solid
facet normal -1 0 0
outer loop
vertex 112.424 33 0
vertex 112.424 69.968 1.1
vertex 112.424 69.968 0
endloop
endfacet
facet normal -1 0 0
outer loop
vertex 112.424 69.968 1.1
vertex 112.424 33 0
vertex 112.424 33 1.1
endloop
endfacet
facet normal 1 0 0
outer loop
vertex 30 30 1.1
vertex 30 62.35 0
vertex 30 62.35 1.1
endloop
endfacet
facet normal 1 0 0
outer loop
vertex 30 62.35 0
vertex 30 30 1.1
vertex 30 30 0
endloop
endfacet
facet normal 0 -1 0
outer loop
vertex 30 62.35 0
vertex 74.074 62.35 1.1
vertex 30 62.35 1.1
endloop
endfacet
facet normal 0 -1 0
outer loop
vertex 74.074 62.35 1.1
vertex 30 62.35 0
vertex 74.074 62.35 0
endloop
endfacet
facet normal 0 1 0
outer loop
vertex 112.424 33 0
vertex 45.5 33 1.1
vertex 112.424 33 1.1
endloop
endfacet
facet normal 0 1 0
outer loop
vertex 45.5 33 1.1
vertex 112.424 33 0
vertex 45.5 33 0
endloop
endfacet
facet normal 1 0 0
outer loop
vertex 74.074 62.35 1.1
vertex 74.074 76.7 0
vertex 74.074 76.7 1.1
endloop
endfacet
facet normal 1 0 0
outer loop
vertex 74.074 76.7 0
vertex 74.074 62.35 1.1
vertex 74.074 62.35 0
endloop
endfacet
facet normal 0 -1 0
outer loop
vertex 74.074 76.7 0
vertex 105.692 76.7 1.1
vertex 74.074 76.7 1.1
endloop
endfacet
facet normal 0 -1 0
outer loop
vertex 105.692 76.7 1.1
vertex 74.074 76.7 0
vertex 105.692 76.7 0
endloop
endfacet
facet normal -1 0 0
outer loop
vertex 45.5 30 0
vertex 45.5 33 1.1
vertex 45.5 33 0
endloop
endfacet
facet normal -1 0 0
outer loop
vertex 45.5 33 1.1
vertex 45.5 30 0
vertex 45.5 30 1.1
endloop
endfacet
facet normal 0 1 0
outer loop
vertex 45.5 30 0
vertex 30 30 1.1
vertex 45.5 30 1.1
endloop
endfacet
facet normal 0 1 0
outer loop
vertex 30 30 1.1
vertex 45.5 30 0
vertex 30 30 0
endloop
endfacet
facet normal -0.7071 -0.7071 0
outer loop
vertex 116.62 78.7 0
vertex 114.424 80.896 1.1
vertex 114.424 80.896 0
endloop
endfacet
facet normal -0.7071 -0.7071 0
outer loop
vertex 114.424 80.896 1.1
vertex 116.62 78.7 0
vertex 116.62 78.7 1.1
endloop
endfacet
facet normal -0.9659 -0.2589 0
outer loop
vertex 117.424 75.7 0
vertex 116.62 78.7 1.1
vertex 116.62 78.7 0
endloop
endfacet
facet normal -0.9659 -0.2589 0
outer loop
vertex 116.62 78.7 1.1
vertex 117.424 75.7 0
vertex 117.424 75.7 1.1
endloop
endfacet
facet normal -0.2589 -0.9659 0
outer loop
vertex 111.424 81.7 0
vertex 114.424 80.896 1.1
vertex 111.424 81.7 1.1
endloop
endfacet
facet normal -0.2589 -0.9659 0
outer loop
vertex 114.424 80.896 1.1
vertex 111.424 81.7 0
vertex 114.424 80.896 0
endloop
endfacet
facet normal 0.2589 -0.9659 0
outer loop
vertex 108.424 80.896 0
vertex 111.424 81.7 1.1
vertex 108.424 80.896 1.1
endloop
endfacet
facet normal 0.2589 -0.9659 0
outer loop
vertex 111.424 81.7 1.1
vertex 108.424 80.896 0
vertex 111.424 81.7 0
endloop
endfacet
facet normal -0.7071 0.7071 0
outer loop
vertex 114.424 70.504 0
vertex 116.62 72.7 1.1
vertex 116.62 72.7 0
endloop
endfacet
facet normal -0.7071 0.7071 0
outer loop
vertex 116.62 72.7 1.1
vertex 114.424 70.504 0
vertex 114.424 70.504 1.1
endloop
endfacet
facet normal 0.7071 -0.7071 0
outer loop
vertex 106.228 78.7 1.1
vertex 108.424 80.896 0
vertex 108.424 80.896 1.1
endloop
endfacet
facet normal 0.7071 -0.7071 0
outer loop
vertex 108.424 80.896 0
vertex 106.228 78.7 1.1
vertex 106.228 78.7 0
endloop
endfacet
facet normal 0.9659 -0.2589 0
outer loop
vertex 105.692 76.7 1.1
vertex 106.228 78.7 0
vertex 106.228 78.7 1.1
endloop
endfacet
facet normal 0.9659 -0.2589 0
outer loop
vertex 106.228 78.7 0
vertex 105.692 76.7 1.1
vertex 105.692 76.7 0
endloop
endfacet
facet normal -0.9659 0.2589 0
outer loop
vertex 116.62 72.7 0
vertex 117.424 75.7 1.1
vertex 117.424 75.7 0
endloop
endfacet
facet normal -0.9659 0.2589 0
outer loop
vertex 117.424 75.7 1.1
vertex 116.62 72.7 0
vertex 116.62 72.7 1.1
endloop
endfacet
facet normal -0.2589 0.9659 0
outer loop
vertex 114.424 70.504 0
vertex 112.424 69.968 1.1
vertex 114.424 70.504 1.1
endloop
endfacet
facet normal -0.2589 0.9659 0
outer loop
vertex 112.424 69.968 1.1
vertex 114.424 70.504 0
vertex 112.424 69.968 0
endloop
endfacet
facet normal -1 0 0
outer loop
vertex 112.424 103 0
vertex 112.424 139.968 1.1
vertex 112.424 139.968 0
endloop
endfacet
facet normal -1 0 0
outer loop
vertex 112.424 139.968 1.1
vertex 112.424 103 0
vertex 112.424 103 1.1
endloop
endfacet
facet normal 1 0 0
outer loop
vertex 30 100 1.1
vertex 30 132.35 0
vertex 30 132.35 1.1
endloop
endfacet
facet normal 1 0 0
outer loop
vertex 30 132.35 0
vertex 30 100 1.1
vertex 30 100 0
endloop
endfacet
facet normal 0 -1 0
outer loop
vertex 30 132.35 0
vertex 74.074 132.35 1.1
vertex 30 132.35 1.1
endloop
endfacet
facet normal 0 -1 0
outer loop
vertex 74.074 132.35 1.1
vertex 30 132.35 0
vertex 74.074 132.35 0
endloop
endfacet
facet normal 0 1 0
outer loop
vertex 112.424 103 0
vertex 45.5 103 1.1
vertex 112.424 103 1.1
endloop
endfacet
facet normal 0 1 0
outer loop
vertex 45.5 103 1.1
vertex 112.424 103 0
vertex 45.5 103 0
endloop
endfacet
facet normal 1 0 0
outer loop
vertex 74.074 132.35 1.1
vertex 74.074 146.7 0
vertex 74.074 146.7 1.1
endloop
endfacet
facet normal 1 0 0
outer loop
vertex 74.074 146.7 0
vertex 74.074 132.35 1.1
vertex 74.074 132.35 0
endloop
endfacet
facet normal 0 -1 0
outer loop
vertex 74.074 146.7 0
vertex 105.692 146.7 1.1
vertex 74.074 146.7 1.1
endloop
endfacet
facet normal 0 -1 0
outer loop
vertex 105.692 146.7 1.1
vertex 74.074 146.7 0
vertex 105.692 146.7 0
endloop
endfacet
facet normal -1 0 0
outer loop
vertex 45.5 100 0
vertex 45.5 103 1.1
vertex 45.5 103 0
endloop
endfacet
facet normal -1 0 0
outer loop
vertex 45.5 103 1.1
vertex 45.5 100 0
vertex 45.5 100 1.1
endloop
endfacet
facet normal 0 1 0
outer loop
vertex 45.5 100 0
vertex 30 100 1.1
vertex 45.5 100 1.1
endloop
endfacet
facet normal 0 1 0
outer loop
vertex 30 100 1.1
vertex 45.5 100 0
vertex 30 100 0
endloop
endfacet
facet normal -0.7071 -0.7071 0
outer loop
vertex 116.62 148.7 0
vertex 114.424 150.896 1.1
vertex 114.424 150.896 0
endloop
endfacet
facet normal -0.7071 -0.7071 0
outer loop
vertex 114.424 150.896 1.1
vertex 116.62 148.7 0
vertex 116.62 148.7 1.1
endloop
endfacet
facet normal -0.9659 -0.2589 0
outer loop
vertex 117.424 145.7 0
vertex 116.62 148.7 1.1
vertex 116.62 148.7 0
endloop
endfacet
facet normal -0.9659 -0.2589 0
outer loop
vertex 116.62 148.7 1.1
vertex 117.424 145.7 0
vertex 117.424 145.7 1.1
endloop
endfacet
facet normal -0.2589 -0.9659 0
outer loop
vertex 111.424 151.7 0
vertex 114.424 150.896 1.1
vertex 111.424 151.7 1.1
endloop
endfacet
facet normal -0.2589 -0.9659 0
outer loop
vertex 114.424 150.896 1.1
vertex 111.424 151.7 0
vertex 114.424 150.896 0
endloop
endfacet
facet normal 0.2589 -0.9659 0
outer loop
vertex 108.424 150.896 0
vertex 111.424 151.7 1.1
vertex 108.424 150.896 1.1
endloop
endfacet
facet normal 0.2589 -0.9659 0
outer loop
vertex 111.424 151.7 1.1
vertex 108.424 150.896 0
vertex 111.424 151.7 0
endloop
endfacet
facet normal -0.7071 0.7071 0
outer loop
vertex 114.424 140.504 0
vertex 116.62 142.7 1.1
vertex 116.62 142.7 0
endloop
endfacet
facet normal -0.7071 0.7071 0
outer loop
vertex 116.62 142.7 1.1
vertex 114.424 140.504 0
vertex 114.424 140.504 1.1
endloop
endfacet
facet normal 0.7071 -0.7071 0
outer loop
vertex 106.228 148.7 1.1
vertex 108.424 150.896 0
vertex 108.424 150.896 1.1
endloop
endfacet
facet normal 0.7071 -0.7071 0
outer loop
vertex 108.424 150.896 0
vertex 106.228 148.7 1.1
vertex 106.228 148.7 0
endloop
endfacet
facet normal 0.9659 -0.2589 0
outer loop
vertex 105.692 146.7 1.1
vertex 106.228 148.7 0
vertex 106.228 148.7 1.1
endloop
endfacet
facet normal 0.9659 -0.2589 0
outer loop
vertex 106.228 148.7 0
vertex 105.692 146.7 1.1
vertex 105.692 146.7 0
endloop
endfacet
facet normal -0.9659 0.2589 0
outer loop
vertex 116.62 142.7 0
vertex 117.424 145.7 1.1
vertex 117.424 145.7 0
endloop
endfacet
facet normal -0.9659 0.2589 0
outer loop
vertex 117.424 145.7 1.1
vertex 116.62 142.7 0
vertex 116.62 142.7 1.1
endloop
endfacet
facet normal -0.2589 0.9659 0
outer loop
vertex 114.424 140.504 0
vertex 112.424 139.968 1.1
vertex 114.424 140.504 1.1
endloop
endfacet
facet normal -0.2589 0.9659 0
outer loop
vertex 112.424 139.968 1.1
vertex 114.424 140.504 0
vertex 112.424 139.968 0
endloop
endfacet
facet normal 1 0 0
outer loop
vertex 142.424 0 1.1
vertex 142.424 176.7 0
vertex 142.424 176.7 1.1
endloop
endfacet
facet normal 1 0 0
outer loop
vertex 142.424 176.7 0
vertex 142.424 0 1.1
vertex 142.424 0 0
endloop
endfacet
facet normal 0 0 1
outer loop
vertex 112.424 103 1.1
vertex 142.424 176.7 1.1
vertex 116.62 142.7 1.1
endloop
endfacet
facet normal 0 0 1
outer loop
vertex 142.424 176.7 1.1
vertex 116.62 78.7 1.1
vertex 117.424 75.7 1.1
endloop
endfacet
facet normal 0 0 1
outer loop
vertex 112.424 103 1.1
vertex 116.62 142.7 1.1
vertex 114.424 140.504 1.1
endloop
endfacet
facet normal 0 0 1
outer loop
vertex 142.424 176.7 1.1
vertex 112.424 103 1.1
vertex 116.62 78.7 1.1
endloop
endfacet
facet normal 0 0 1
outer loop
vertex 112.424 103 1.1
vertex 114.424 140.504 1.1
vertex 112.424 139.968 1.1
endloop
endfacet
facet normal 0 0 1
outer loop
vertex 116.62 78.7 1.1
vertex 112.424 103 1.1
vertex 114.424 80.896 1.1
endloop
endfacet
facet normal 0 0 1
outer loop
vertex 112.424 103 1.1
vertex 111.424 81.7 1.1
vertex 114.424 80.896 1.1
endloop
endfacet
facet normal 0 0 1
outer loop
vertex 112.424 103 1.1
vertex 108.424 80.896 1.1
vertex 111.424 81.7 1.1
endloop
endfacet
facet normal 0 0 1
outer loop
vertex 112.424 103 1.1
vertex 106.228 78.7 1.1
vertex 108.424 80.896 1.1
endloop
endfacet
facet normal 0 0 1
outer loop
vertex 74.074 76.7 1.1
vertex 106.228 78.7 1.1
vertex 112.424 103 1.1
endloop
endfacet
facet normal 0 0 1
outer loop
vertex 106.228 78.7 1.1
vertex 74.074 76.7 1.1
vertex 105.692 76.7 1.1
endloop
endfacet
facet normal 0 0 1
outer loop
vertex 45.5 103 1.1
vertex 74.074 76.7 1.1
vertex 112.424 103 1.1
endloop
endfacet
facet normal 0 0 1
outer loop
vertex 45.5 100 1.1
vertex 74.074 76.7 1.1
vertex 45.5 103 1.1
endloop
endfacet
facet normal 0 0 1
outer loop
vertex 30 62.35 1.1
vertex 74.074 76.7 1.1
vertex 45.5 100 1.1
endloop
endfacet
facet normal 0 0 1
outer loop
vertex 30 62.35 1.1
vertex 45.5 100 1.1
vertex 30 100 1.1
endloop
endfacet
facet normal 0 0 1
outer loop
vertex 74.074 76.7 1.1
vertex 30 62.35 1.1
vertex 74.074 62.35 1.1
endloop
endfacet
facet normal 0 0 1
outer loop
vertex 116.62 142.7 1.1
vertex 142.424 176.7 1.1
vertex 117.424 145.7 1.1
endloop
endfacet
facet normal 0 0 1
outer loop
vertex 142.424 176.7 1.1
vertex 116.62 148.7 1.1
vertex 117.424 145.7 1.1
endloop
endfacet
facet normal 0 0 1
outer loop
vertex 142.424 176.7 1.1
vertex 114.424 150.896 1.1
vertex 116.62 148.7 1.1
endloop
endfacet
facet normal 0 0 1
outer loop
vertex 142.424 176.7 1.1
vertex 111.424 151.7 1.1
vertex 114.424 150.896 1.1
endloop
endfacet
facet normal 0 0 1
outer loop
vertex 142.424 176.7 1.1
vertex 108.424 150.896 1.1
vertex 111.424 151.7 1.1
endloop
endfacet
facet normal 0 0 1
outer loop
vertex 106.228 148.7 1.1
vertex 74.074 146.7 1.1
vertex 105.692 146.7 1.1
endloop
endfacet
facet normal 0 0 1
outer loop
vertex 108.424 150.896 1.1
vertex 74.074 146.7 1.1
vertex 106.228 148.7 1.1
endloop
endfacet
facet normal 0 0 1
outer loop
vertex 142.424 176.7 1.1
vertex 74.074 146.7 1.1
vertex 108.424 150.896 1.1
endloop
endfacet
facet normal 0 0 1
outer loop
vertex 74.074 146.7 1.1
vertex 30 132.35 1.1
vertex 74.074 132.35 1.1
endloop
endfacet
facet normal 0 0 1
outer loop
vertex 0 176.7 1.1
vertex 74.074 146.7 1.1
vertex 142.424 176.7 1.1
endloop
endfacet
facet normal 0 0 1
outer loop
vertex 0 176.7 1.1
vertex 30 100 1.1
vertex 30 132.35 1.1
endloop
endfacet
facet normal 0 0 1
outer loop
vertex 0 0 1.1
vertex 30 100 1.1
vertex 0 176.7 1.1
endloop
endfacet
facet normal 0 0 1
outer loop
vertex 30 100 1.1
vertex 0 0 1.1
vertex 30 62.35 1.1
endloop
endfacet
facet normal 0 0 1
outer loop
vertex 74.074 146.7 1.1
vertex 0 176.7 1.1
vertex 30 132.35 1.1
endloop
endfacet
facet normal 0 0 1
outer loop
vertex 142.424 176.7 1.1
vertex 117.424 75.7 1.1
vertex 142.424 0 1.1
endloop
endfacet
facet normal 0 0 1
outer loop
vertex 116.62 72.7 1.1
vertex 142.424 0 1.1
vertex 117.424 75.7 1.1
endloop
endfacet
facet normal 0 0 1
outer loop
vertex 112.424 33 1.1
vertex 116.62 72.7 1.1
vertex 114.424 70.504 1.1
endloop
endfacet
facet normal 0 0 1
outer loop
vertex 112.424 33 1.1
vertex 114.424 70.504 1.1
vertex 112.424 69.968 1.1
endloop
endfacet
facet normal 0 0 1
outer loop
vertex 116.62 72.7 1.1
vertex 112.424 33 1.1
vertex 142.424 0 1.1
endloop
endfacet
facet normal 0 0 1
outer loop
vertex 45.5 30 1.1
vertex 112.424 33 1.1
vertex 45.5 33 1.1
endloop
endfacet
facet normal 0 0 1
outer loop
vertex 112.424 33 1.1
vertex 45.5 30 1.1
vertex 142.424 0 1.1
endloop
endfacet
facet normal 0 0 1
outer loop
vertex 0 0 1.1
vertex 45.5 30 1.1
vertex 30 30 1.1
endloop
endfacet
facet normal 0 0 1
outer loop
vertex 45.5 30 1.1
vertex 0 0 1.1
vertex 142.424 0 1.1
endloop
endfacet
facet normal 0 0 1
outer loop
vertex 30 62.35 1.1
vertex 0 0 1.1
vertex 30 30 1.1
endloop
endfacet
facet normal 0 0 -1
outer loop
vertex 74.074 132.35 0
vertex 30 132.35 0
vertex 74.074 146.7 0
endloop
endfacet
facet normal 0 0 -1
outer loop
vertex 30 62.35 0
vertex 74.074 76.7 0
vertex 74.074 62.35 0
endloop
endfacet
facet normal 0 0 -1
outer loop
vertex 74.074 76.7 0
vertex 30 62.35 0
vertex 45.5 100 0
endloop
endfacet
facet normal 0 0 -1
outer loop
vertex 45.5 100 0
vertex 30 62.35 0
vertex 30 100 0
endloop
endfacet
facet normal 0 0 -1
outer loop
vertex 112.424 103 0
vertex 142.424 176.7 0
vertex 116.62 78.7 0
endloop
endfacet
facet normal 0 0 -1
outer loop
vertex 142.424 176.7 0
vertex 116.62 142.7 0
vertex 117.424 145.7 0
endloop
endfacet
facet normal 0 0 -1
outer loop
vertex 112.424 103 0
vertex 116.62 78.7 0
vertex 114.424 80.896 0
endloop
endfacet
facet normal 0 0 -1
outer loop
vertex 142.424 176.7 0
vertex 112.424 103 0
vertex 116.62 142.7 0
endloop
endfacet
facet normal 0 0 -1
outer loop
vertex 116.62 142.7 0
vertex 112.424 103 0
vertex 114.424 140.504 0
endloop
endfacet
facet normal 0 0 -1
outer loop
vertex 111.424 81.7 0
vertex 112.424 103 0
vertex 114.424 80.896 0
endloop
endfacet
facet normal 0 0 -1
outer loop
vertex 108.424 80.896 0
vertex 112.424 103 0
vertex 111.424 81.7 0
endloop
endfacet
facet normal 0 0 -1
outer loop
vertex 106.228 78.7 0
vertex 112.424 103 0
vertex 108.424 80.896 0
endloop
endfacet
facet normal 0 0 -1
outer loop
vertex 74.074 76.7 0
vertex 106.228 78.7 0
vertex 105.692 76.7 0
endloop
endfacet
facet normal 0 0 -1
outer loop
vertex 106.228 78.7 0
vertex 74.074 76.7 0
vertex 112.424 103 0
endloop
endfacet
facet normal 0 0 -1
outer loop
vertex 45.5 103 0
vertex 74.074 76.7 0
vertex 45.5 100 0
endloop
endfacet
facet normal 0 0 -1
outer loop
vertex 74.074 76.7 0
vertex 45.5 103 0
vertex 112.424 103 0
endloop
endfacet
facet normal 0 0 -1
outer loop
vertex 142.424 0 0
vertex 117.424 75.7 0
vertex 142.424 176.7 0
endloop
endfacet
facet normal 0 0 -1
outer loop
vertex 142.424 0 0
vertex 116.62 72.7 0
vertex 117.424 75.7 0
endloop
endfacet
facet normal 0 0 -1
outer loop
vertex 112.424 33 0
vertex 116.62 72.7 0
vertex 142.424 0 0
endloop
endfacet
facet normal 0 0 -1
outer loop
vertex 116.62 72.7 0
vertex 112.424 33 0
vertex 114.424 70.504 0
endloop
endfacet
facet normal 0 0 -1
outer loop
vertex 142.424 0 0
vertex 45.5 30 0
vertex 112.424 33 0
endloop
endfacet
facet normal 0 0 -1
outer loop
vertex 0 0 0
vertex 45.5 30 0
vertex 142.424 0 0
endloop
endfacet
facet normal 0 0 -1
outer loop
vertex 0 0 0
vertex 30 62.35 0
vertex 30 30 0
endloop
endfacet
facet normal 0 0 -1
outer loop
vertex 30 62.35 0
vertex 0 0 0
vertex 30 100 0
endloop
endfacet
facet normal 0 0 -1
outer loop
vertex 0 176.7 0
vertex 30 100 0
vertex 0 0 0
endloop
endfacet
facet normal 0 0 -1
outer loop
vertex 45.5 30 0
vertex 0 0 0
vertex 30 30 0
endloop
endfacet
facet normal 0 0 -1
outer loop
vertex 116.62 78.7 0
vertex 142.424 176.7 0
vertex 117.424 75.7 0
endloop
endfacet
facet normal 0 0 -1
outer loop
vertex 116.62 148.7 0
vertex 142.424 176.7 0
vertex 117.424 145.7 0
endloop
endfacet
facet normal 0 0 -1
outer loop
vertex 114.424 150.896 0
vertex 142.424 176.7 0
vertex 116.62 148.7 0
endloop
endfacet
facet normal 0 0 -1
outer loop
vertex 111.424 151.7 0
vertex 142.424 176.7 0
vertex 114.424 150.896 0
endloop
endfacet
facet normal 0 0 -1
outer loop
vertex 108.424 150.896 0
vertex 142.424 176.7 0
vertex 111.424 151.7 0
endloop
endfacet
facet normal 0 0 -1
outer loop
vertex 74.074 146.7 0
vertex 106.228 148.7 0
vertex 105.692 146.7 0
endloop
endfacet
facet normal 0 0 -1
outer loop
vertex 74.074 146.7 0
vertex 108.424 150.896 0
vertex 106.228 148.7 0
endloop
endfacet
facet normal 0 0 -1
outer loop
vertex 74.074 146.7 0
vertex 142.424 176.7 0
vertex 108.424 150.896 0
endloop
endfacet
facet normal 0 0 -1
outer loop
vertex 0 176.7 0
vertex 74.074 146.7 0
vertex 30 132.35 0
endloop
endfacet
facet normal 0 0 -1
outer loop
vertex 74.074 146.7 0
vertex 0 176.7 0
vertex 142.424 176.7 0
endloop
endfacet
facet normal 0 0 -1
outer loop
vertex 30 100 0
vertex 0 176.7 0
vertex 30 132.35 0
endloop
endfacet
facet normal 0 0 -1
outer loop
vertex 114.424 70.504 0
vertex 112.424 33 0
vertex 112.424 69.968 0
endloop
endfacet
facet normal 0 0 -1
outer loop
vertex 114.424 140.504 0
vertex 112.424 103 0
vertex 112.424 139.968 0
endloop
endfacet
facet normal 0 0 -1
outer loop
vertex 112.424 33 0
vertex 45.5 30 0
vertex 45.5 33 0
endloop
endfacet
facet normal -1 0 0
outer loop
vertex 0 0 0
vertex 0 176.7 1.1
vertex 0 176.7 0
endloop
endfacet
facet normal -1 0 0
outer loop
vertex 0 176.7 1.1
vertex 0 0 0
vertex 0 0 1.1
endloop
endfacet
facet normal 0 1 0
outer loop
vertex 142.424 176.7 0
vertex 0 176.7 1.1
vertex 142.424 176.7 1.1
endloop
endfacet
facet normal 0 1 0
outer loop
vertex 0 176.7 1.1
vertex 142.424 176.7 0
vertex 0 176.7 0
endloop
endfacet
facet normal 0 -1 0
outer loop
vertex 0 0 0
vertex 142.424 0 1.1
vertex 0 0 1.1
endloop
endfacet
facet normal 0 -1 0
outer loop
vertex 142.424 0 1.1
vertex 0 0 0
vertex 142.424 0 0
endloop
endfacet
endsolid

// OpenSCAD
// Holder for Ormerod prototype differential IR sensor board
// Choose layer height to be a submultiple of the thickness

thickness=1.1;	// board is 1.2mm but this part comes out slightly too thick
xborder=30;
yborder=30;
yrepeat=70;
height=82.07375;
width=29.00;
nibWidth=3.0;
nibHeight=15.5;	//actually 14.605
upperWidth=43.35;
upperHeight=38;
clearance=0.35;
cornerRadius=1.5;
cornerOffset=1;
overlap=1;

module wedge(x,y,z)
{
	polyhedron(
		points=[[0,0,0],[x,0,0],[0,y,0],[0,0,z],[x,0,z],[0,y,z]],
		faces=[[0,2,1],[3,4,5],[0,1,3],[1,4,3],[1,2,4],[2,5,4],[0,3,2],[5,2,3]]
	);
}

module boardCutout()
{
	translate([0,nibWidth,-overlap])
		cube([height+clearance,width+clearance,thickness+2*overlap]);
	translate([height-upperHeight,nibWidth,-overlap])
		cube([upperHeight+clearance,upperWidth+clearance,thickness+2*overlap]);
	translate([0,0,-overlap])
		cube([nibHeight,nibWidth+overlap,thickness+2*overlap]);
	translate([height+clearance-cornerOffset,upperWidth+nibWidth+clearance-cornerOffset,-overlap])
		cylinder(r=6,h=thickness+2*overlap,$fn=12);
}


difference()
{
	cube([height+2*xborder+clearance,upperWidth+nibWidth+2*yborder+clearance+yrepeat,thickness]);
	translate([xborder,yborder,0]) boardCutout();
	translate([xborder,yborder+yrepeat,0]) boardCutout();
}

translate([12-overlap,16-overlap,0]) wedge(10+2*overlap,10+2*overlap,thickness);
